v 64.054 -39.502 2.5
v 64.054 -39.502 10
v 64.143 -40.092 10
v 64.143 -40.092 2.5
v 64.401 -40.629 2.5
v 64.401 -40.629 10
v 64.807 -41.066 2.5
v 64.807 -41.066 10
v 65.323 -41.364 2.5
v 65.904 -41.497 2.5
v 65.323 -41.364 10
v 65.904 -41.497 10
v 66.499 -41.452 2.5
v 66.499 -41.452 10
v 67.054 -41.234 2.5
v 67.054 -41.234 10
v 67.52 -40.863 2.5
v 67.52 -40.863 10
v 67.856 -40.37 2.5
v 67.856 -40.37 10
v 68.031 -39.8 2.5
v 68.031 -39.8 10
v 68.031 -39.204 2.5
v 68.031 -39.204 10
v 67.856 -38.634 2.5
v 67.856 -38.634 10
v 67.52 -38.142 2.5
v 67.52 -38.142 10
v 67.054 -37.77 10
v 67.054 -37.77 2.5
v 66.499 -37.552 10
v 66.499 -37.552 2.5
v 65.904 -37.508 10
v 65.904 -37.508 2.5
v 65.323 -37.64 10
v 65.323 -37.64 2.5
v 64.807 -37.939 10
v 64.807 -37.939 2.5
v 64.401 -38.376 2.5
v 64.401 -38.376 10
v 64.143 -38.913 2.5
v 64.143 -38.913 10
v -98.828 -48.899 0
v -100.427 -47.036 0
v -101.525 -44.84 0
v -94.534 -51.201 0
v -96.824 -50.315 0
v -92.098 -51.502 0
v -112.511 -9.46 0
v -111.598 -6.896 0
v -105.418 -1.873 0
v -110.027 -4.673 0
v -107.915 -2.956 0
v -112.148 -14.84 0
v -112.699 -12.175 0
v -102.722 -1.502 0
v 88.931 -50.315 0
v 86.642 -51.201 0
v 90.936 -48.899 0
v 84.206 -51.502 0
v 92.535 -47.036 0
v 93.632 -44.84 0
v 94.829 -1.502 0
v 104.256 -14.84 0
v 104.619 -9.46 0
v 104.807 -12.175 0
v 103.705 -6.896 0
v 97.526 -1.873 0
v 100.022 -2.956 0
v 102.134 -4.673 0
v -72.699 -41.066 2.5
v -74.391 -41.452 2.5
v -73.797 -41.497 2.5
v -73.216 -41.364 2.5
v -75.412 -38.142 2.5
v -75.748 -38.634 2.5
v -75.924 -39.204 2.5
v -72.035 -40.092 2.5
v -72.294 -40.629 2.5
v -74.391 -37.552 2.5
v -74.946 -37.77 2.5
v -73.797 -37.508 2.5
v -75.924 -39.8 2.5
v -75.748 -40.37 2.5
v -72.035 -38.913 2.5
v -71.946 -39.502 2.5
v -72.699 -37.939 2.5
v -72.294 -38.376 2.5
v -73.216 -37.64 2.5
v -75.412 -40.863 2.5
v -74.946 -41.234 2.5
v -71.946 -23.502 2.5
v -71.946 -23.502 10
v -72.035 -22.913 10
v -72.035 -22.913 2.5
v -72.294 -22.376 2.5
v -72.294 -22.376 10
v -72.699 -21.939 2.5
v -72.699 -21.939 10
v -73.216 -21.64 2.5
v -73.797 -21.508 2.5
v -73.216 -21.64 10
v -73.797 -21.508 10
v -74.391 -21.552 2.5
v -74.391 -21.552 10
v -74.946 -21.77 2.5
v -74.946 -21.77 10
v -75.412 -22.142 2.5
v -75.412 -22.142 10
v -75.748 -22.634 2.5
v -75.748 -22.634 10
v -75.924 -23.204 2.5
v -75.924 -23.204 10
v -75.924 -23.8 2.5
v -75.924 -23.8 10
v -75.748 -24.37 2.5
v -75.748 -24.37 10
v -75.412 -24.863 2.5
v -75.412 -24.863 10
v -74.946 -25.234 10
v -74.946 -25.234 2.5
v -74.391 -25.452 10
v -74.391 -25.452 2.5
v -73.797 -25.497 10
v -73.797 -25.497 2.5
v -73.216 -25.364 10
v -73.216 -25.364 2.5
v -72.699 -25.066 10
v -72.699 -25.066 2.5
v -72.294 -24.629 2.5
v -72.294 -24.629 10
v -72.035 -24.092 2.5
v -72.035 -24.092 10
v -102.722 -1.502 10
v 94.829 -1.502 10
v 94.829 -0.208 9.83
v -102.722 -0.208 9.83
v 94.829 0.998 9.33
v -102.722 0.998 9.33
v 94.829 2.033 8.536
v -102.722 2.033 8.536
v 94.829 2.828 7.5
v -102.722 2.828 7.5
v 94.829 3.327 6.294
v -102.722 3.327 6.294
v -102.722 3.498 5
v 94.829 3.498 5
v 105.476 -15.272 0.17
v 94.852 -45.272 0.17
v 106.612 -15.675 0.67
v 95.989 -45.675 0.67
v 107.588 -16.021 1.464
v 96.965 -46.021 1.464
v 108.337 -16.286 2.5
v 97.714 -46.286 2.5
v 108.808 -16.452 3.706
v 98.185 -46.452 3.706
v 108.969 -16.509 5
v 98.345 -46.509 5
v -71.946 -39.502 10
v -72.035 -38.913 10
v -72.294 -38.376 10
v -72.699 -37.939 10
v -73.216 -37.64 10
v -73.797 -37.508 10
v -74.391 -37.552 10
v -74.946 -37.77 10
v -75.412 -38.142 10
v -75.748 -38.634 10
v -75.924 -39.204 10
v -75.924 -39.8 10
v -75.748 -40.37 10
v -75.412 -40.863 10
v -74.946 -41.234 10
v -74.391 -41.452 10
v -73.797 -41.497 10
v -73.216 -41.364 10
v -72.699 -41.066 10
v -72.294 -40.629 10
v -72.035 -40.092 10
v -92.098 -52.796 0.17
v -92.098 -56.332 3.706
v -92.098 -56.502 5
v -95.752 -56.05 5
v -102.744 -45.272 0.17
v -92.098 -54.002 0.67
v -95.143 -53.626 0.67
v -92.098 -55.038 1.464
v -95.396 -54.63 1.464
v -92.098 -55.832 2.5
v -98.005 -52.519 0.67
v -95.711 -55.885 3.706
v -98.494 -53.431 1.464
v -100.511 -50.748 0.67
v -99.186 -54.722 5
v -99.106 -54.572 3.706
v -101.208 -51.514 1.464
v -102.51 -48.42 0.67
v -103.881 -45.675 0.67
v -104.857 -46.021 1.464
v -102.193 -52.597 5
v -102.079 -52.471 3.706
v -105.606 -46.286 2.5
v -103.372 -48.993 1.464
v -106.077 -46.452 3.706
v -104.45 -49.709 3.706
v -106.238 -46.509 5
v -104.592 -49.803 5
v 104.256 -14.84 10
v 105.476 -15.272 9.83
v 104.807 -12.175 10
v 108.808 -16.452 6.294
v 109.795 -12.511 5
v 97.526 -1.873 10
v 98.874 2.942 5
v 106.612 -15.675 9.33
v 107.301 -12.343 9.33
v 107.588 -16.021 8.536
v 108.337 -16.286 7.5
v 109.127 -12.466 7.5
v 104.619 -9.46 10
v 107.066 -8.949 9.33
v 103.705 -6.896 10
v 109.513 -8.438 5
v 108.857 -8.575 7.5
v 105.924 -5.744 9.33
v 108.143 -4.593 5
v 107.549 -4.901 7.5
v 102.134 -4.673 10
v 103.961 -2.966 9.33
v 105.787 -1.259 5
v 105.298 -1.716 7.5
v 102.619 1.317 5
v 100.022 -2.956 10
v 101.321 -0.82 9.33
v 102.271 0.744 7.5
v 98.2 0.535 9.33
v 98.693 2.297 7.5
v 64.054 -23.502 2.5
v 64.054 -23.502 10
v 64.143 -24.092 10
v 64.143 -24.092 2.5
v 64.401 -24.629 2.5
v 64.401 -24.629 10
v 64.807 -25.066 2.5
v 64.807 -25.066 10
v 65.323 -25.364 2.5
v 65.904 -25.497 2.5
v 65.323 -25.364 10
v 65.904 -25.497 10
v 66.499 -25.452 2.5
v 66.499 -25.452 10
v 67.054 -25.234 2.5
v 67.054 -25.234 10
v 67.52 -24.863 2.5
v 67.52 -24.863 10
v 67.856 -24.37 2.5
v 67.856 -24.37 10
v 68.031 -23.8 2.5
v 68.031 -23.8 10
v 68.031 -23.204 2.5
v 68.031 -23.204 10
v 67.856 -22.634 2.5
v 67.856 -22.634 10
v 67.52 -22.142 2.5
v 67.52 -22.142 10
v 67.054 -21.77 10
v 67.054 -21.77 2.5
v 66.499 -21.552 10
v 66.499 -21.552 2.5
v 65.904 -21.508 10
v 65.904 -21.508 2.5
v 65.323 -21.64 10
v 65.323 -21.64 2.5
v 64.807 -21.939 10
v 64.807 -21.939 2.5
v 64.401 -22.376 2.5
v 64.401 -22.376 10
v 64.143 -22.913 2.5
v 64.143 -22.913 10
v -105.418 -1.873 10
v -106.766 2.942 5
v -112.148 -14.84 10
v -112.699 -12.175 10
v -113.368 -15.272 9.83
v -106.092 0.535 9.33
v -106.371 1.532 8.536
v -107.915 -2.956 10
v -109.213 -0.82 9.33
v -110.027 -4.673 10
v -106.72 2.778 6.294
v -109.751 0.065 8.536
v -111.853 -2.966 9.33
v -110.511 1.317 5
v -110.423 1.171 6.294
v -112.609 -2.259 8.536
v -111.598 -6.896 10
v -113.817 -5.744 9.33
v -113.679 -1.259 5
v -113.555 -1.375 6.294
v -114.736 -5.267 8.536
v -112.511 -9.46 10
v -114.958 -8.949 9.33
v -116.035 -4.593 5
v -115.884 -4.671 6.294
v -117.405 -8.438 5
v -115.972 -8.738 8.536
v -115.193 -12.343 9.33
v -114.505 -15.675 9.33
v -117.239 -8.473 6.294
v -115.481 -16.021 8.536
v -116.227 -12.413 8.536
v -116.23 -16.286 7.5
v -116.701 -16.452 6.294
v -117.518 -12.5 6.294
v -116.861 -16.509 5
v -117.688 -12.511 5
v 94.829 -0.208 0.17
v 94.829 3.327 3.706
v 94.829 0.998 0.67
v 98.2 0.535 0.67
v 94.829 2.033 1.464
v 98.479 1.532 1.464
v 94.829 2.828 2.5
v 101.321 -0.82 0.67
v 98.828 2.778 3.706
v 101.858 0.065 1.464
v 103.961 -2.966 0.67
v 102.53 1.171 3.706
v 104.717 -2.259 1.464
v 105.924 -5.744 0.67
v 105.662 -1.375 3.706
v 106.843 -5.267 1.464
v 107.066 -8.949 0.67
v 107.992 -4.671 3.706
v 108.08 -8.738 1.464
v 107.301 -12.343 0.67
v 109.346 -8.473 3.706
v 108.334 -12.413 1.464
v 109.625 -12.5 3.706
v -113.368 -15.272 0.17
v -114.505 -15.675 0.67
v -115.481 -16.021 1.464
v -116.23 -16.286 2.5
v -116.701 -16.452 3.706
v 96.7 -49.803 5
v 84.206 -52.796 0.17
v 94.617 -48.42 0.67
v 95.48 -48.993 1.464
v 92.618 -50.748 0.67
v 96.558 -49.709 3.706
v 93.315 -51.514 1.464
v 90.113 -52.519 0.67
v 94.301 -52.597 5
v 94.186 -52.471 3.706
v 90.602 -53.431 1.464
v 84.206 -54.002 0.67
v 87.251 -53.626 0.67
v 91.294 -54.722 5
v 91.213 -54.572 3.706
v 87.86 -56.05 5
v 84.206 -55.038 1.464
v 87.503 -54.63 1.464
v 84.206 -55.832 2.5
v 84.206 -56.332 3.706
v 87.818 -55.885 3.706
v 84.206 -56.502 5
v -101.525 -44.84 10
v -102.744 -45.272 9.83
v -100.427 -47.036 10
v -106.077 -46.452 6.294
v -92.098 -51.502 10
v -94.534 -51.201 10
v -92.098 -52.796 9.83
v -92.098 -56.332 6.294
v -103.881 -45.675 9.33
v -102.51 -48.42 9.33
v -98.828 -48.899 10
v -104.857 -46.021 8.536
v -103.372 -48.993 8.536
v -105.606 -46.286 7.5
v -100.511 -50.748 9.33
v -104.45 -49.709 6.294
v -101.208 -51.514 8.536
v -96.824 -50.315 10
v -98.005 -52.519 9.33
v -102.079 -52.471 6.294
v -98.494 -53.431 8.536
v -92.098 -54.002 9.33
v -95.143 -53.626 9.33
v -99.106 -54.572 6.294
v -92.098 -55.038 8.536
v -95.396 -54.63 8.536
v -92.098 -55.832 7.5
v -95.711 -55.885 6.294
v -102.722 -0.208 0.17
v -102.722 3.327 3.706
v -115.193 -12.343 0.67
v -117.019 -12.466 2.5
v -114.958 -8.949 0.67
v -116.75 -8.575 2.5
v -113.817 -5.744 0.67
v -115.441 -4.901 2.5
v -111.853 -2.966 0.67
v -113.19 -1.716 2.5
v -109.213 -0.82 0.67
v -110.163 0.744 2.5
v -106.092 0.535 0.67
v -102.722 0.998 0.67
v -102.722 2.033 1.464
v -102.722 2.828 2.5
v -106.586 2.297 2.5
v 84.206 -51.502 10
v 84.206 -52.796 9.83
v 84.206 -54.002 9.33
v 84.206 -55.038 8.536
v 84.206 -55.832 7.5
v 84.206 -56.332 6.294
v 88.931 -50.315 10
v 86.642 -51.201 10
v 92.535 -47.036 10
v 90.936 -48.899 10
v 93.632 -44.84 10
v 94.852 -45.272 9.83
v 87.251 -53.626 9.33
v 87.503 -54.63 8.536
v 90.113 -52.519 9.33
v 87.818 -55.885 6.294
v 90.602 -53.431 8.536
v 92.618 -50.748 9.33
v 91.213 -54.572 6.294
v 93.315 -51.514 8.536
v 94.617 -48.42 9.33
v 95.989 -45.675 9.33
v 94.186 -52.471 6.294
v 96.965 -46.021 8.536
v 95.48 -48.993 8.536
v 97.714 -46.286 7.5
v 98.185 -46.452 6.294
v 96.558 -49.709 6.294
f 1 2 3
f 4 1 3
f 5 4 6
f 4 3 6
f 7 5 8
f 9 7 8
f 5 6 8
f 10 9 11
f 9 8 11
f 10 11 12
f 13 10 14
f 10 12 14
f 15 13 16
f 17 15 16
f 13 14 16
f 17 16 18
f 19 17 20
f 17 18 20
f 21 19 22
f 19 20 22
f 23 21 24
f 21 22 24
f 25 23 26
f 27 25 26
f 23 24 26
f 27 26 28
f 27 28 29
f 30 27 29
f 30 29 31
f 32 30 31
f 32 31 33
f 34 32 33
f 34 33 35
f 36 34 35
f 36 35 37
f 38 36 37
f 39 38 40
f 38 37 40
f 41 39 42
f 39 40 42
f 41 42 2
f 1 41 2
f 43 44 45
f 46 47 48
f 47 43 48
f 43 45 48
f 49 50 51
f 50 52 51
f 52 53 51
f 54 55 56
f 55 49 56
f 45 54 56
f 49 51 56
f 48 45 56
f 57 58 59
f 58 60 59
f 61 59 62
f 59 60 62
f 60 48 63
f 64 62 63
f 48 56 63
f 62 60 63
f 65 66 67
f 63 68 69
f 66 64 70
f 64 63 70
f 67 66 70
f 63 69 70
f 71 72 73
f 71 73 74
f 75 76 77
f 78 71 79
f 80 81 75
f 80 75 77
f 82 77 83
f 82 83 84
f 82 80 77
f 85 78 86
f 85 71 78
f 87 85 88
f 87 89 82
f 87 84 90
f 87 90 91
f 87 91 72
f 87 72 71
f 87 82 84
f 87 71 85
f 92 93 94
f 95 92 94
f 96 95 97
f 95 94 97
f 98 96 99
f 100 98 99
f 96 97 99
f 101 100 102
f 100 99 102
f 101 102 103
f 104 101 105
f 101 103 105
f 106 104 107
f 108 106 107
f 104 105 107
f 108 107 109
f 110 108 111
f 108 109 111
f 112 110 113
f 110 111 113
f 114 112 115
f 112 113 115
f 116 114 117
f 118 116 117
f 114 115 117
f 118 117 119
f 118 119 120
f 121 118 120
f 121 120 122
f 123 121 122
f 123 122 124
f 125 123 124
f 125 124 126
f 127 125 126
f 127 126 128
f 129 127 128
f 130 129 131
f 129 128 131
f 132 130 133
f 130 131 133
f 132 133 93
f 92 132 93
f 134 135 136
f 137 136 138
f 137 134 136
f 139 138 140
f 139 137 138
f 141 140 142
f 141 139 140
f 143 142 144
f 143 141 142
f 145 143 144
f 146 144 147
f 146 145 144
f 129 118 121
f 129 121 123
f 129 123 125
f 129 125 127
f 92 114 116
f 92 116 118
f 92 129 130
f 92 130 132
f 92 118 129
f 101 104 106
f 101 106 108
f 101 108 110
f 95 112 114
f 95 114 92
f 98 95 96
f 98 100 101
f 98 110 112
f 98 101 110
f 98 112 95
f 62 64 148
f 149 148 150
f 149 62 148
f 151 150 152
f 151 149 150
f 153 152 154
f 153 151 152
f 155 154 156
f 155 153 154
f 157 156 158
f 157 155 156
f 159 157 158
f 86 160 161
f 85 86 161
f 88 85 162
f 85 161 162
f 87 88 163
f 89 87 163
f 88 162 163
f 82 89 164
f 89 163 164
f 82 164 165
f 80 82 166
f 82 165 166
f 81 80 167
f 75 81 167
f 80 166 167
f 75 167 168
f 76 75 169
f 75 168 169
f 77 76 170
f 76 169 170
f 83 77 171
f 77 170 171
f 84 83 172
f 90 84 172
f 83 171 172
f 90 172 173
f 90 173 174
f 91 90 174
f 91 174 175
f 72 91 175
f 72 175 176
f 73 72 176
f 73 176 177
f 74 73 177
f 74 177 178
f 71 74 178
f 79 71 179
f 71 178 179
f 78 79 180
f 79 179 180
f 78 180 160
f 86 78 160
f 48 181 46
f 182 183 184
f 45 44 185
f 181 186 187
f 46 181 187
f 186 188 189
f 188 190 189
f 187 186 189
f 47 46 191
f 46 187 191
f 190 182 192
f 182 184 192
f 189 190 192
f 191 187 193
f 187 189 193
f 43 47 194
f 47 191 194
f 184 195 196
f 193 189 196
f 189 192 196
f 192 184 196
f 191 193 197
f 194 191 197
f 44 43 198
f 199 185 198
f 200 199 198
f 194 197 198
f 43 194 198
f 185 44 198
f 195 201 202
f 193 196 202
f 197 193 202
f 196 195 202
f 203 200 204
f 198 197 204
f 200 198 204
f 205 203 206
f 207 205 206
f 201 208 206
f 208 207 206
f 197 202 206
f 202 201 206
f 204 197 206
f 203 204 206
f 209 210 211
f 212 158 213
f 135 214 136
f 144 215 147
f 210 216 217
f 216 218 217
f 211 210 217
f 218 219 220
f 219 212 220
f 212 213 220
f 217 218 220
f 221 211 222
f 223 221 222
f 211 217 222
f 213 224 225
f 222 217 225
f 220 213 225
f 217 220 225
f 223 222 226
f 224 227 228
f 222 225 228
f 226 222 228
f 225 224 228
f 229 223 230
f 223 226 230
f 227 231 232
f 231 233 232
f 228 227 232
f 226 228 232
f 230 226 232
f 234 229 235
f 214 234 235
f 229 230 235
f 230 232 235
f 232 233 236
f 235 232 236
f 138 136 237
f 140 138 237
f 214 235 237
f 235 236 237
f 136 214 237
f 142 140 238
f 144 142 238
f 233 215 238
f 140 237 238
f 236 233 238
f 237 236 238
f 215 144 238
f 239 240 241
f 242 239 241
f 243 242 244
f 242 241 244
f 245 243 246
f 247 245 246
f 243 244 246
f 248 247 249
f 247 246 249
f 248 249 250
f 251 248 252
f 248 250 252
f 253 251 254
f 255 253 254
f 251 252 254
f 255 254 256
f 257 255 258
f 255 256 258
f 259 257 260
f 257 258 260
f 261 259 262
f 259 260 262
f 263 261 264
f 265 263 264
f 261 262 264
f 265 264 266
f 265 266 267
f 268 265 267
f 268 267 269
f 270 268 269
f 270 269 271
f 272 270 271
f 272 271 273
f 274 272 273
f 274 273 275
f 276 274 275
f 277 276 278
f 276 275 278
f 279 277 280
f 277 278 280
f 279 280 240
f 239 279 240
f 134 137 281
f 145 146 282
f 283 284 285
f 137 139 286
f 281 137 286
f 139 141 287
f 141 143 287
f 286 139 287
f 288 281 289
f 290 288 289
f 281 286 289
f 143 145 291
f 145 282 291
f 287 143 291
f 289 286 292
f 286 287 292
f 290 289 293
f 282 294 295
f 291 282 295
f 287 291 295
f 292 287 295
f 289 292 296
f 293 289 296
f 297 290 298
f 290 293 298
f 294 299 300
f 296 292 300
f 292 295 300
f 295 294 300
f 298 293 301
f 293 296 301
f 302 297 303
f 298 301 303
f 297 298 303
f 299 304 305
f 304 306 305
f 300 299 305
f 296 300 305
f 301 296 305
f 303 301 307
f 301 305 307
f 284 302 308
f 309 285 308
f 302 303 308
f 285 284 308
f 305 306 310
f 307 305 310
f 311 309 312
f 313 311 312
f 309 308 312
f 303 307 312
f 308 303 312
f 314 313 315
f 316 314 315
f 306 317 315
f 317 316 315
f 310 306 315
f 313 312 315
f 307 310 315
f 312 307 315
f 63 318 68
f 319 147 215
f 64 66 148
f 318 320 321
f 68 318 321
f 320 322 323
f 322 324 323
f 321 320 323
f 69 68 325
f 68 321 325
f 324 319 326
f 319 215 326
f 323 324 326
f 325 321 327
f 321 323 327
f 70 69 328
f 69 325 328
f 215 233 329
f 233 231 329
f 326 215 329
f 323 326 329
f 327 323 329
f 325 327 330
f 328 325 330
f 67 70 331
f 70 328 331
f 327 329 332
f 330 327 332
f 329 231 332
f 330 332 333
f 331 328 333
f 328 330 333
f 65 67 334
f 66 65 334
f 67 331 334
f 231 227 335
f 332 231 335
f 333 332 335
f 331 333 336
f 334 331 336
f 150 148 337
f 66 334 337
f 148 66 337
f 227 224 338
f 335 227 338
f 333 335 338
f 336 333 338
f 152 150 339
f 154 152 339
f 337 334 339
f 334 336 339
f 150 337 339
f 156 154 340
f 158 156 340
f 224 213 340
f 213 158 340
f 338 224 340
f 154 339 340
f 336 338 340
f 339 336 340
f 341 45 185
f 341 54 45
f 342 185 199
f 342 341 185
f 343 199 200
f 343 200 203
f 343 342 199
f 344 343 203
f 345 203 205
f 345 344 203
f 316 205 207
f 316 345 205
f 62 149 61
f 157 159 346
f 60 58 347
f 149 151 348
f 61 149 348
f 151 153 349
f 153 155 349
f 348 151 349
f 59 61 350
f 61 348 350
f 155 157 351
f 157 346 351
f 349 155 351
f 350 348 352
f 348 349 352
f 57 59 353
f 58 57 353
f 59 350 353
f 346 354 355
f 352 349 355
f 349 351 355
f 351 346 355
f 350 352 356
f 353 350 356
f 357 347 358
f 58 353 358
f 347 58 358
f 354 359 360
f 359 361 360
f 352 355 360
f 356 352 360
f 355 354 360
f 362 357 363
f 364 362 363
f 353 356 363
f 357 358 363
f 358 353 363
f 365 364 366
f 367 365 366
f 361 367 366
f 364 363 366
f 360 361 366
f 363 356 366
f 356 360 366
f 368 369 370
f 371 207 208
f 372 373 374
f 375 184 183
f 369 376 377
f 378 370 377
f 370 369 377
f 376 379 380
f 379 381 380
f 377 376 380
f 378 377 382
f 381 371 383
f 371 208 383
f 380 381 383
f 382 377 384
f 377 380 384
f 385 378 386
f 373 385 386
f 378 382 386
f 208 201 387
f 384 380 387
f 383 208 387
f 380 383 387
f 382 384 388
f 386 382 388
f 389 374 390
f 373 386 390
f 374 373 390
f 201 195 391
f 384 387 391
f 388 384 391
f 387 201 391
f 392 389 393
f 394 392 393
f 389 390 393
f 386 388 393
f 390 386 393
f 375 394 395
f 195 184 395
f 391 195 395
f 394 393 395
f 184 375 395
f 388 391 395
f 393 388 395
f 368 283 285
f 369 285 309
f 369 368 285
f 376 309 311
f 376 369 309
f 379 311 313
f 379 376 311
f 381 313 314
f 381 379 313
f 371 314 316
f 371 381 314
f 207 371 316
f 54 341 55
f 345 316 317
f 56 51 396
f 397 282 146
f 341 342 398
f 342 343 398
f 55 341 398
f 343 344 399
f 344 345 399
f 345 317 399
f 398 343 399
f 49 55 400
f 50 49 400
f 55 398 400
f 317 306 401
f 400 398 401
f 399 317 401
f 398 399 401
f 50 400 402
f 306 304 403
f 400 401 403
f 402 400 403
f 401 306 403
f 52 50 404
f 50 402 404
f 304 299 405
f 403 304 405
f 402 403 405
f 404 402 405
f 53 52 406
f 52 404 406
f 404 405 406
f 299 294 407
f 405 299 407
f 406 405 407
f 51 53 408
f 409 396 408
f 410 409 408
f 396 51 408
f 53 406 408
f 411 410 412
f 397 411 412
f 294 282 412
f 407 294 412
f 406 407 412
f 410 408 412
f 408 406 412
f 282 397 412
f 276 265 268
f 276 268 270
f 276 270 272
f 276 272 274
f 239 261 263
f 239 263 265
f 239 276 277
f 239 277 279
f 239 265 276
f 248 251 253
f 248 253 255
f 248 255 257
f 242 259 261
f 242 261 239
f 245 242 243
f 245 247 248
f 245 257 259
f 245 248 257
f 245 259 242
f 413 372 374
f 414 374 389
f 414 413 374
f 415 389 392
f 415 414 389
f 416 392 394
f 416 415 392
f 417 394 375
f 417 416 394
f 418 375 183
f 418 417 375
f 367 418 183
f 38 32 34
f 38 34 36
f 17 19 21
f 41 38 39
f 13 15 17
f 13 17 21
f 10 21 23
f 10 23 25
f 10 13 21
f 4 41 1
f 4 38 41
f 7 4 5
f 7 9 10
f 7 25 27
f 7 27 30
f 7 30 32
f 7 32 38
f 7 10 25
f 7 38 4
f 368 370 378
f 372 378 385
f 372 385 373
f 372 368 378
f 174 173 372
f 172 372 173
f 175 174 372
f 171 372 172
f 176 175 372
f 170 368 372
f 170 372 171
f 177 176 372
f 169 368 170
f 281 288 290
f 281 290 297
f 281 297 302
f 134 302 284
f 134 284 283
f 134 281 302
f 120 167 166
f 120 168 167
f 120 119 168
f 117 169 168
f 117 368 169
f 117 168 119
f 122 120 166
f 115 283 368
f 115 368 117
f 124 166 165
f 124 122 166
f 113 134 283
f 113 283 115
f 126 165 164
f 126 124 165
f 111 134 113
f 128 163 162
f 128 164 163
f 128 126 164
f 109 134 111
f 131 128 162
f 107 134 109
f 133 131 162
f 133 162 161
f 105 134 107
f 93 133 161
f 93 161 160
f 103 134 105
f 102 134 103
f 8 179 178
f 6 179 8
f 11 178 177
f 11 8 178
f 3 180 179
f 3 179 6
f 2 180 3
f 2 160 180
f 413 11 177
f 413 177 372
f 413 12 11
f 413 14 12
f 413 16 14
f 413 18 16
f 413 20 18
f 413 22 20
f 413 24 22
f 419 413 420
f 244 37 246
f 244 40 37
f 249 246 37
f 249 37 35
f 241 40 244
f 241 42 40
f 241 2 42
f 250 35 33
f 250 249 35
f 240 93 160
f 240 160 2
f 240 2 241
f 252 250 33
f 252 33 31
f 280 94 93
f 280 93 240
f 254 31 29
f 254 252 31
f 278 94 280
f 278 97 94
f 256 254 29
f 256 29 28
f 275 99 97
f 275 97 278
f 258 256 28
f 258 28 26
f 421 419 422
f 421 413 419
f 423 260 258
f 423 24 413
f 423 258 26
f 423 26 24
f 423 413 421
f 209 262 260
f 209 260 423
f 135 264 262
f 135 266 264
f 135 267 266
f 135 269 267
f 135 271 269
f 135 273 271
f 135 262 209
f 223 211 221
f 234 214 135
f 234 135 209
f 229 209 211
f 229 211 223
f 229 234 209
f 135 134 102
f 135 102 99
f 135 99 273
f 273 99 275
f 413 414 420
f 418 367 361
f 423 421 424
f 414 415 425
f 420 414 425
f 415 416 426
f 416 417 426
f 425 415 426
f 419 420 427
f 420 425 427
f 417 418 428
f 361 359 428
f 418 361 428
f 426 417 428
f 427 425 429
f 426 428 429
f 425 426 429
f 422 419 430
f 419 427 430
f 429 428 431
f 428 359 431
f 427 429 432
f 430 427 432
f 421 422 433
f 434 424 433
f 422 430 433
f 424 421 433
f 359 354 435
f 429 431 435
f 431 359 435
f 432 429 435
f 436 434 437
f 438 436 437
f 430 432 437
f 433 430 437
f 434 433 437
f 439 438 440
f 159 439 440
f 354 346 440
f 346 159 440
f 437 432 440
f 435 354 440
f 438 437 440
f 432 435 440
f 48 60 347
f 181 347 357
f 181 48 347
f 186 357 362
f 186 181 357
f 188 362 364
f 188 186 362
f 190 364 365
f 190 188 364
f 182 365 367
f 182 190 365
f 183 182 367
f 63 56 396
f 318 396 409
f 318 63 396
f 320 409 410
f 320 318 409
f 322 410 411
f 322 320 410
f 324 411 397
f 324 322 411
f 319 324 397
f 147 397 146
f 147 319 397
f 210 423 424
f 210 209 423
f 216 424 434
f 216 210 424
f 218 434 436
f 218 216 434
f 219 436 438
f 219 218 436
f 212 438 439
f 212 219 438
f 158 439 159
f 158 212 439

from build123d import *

# Parameters (mm, degrees)
EXTRUDE_1_DEPTH     = 10
FILLET_1_R          = 15
FILLET_2_R          = 5
SKETCH_2_R          = 2
CUT_EXTRUDE_1_DEPTH = 7.5


with BuildPart() as part:
    # 草圖1 → 填料-伸長1 (new body)
    with BuildSketch(Plane.XY):
        Polygon((-123.946188341, 3.497757848), (-102.699073989, -56.502242152), (94.806697307, -56.502242152), (116.053811659, 3.497757848), align=None)
    extrude(amount=EXTRUDE_1_DEPTH)

    # 圓角1
    fillet_1_edges = [part.edges().sort_by_distance(p)[0] for p in [
        (116.053811659, 3.497757848, 5),
        (94.806697307, -56.502242152, 5),
        (-102.699073989, -56.502242152, 5),
        (-123.946188341, 3.497757848, 5),
    ]]
    fillet(fillet_1_edges, radius=FILLET_1_R)

    # 圓角2
    fillet_2_edges = [part.edges().sort_by_distance(p)[0] for p in [
        (107.078925905, -2.845064302, 10),
        (103.657146356, -31.509345041, 10),
        (92.862923252, -53.75186548, 10),
        (-3.946188341, -56.502242152, 10),
        (-100.755299934, -53.75186548, 10),
        (-111.549523037, -31.509345041, 10),
        (-114.971302586, -2.845064302, 10),
        (-3.946188341, 3.497757848, 10),
        (-114.971302586, -2.845064302, 0),
        (-111.549523037, -31.509345041, 0),
        (-100.755299934, -53.75186548, 0),
        (-3.946188341, -56.502242152, 0),
        (92.862923252, -53.75186548, 0),
        (103.657146356, -31.509345041, 0),
        (107.078925905, -2.845064302, 0),
        (-3.946188341, 3.497757848, 0),
    ]]
    fillet(fillet_2_edges, radius=FILLET_2_R - 0.0001)  # a hair under: the kernel refuses the full size

    # 草圖2 → 除料-伸長1 (cut)
    with BuildSketch(Plane.XY.offset(10)):
        with Locations((-73.946188341, -23.502242152)):
            Circle(SKETCH_2_R)
        with Locations((-73.946188341, -39.502242152)):
            Circle(SKETCH_2_R)
        with Locations(Location((66.053811659, -39.502242152, 0), (0, 0, 180))):
            Circle(SKETCH_2_R)
        with Locations(Location((66.053811659, -23.502242152, 0), (0, 0, 180))):
            Circle(SKETCH_2_R)
    extrude(amount=-CUT_EXTRUDE_1_DEPTH, mode=Mode.SUBTRACT)


solid = part.part
